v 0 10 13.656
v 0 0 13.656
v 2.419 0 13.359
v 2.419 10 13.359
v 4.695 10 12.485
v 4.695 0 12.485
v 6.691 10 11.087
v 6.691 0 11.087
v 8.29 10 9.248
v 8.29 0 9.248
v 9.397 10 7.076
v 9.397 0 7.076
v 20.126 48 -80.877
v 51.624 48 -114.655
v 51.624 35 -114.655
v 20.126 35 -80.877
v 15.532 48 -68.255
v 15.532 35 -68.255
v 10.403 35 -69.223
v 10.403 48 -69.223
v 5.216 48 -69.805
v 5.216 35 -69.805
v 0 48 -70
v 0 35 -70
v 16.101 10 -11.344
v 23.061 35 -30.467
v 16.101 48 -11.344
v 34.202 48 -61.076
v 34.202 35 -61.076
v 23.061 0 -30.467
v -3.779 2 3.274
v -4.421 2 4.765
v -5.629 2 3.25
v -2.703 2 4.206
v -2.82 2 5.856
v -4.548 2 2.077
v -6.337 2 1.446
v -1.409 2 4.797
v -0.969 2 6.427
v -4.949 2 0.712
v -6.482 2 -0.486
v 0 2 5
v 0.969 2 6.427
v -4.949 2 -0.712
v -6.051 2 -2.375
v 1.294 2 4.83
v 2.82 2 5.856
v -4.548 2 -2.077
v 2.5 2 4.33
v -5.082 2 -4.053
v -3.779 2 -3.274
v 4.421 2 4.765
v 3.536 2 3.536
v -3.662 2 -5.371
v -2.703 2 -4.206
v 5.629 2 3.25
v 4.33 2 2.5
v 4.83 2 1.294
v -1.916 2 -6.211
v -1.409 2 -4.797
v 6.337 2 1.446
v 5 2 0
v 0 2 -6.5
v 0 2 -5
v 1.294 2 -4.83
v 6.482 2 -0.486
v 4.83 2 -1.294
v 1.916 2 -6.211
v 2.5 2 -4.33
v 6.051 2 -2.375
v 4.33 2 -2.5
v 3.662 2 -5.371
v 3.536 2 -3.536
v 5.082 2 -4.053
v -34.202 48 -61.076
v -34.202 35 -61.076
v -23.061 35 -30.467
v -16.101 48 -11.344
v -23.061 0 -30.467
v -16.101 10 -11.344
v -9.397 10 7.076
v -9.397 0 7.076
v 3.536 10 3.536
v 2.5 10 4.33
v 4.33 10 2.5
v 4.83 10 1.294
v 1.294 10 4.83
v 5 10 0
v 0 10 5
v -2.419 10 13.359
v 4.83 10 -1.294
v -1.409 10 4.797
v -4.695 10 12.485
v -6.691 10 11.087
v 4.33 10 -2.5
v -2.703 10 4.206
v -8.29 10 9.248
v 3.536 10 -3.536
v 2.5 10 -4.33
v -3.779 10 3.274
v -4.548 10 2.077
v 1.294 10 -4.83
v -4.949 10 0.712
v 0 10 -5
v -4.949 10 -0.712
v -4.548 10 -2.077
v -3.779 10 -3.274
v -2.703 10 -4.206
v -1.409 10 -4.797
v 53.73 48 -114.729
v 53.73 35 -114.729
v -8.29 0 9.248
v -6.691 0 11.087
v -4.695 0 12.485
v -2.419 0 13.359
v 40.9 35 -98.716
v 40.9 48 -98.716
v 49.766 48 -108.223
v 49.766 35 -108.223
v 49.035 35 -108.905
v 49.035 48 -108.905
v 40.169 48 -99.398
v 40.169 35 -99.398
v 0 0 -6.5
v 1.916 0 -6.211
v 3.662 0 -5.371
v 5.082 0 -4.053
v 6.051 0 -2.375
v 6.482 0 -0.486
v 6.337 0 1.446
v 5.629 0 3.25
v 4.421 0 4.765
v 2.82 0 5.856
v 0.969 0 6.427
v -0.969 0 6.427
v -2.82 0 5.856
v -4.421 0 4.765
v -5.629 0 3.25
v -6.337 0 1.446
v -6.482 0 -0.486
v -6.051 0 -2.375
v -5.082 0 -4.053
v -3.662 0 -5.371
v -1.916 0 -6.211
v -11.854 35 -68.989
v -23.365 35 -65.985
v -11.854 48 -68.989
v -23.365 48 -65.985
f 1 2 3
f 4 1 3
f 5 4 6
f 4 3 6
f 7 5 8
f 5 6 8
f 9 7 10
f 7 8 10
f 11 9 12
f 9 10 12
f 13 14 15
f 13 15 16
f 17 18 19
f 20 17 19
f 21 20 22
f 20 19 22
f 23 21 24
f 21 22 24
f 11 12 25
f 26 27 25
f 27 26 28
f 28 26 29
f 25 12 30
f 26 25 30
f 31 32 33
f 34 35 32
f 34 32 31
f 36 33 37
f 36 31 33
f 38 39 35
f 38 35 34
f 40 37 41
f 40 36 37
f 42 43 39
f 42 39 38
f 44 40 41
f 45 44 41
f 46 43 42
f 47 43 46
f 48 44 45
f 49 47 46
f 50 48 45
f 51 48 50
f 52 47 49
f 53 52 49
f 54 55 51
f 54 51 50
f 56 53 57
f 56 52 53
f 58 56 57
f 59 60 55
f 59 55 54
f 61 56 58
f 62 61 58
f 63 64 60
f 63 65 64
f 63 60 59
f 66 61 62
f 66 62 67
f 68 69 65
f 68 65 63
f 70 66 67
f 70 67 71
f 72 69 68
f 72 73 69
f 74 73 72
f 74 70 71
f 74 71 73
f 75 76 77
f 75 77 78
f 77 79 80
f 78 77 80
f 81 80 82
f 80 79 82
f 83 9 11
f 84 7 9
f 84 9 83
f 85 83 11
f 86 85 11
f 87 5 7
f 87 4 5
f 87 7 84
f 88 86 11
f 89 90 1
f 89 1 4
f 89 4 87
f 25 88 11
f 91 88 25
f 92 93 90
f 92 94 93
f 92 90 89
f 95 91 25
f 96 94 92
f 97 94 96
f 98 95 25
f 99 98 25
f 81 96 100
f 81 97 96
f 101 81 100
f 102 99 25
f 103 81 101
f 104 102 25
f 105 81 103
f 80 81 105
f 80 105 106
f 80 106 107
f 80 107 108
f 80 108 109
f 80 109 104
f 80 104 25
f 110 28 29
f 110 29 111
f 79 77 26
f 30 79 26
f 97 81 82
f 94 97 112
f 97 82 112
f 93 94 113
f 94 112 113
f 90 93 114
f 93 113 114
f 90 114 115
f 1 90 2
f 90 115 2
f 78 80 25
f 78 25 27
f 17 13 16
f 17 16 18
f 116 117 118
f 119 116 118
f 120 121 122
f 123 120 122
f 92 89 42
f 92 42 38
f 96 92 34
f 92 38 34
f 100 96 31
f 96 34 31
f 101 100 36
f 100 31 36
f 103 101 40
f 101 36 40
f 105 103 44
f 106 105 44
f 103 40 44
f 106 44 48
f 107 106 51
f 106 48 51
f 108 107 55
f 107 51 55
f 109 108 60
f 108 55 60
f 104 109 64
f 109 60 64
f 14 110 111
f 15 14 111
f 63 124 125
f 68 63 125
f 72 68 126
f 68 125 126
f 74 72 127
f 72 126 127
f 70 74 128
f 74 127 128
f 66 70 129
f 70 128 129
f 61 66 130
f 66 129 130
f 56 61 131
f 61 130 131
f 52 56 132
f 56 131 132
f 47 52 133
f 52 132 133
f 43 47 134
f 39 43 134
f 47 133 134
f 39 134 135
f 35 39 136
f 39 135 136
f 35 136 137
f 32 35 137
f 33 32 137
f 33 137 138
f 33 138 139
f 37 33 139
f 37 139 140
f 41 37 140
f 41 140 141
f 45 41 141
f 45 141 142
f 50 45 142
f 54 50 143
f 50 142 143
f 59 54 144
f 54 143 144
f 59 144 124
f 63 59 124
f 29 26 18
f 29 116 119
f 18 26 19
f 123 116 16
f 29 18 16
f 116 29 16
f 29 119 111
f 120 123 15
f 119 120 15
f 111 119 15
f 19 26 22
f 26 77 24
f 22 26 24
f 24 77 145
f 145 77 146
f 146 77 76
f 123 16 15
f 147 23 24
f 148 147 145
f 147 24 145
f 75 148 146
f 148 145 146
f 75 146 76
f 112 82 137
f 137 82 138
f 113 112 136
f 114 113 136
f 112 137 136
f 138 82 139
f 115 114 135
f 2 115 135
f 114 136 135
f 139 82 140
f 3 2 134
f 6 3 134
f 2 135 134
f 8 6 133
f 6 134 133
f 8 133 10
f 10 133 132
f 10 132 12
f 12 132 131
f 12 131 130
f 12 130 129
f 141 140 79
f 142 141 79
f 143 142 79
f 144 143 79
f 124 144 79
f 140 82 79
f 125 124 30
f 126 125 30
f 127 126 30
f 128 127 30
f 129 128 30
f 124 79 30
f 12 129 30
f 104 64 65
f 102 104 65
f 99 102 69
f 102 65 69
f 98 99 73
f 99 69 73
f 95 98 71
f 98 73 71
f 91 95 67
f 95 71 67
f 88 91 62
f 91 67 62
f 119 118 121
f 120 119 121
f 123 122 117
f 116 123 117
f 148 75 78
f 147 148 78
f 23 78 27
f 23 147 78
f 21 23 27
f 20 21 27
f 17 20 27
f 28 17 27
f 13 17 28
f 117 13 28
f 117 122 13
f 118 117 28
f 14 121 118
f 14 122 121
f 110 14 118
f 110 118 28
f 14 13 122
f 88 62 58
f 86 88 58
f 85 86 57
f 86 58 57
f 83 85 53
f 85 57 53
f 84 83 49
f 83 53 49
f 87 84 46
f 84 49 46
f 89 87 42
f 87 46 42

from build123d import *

# Parameters (mm, degrees)
EXTRUDE_1_DEPTH            = 48
CUT_EXTRUDE_2_REACH        = 96.508
CUT_EXTRUDE_2_START_RADIUS = 70
CUT_EXTRUDE_2_END_RADIUS   = 70
SKETCH_3_W                 = 58.404028666
SKETCH_3_H                 = 6
EXTRUDE_2_DEPTH            = 13
CUT_EXTRUDE_3_DEPTH        = 140.034418617
CUT_EXTRUDE_3_DEPTH_BACK   = 140.034418617
SKETCH_4_W                 = 25
SKETCH_4_H                 = 38
SKETCH_4_W_2               = 40
SKETCH_4_H_2               = 25
CHAMFER_1_SIZE             = 5
CHAMFER_1_SIZE2            = 3.813196151
SKETCH_6_R                 = 6.5
CUT_EXTRUDE_4_DEPTH        = 2
SKETCH_7_R                 = 1.5
CUT_EXTRUDE_5_DEPTH        = 60
SKETCH_8_W                 = 9
SKETCH_8_H                 = 9
CUT_EXTRUDE_6_DEPTH        = 11
CUT_EXTRUDE_8_REACH        = 137.533
SKETCH_10_R                = 1
CUT_EXTRUDE_9_REACH        = 105.034
CUT_EXTRUDE_9_END_RADIUS   = 70
SKETCH_11_R                = 0.75
SKETCH_12_W                = 20
SKETCH_12_H                = 3
CUT_EXTRUDE_10_DEPTH       = 11
SKETCH_13_W                = 3.868283576
SKETCH_13_H                = 1.5
CUT_EXTRUDE_11_DEPTH       = 4
CUT_EXTRUDE_12_REACH       = 137.476
SKETCH_15_W                = 94.926723873
SKETCH_15_H                = 55.523178114
CUT_EXTRUDE_13_DEPTH       = 10


with BuildPart() as part:
    # 草图1 → 凸台-拉伸1 (new body)
    with BuildSketch(Plane(origin=(0, 0, 0), x_dir=(1, 0, 0), z_dir=(0, 1, 0))):
        with BuildLine():
            ThreePointArc((-9.396926208, -7.075874358), (-5.735764364, -11.847193368), (0, -13.655672925))
            Line((0, -13.655672925), (0, -5))
            ThreePointArc((0, -5), (-5, 0), (0, 5))
            Line((0, 5), (0, 70))
            ThreePointArc((0, 70), (-17.673593853, 67.732149533), (-34.202014333, 61.075545152))
            Line((-34.202014333, 61.075545152), (-9.396926208, -7.075874358))
        make_face()
        with BuildLine():
            Line((0, -5), (0, -13.655672925))
            ThreePointArc((0, -13.655672925), (5.735764364, -11.847193368), (9.396926208, -7.075874358))
            Line((9.396926208, -7.075874358), (34.202014333, 61.075545152))
            ThreePointArc((34.202014333, 61.075545152), (17.673593853, 67.732149533), (0, 70))
            Line((0, 70), (0, 5))
            ThreePointArc((0, 5), (3.535533906, 3.535533906), (5, 0))
            ThreePointArc((5, 0), (3.535533906, -3.535533906), (0, -5))
        make_face()
    extrude(amount=EXTRUDE_1_DEPTH)

    # 切除-拉伸2: from a cylinder face, 96.508 long prism both ways, kept between that surface and its translate by the depth
    cut_extrude_2_start = Plane(origin=(0, 5, 0), z_dir=(0, -1, 0)) * Cylinder(CUT_EXTRUDE_2_START_RADIUS, 334.016, mode=Mode.PRIVATE)
    cut_extrude_2_end = Plane(origin=(0, 5, 3), z_dir=(0, -1, 0)) * Cylinder(CUT_EXTRUDE_2_END_RADIUS, 334.016, mode=Mode.PRIVATE)
    # 草图3 → 切除-拉伸2 (cut, from a surface)
    with BuildSketch(Plane.XY, mode=Mode.PRIVATE) as cut_extrude_2_sk1:
        with Locations((3, 5)):
            Rectangle(SKETCH_3_W, SKETCH_3_H)
    cut_extrude_2_tool1 = extrude(cut_extrude_2_sk1.sketch, amount=CUT_EXTRUDE_2_REACH, both=True, mode=Mode.PRIVATE)
    add(((cut_extrude_2_tool1 & cut_extrude_2_start) - cut_extrude_2_end).solids().sort_by_distance((3, 5, -62.032204))[0], mode=Mode.SUBTRACT)

    # 草图2 → 凸台-拉伸2 (add)
    with BuildSketch(Plane(origin=(0, 48, 0), x_dir=(1, 0, 0), z_dir=(0, 1, 0))):
        Polygon((24.252642572, 33.739870901), (55.034455471, 118.312206771), (20.125623779, 80.877067961), (5.458790156, 40.580273767), align=None)
    extrude(amount=-EXTRUDE_2_DEPTH)

    # 草图4 → 切除-拉伸3 (cut, two sides: drawn at the far end of the back side and taken through both)
    with BuildSketch(Plane(origin=(0, 0, 0), x_dir=(0, 0, -1), z_dir=(1, 0, 0)).offset(-CUT_EXTRUDE_3_DEPTH_BACK)):
        with Locations((-1.155672925, 29)):
            Rectangle(SKETCH_4_W, SKETCH_4_H)
        with Locations((50.466884927, 22.5)):
            Rectangle(SKETCH_4_W_2, SKETCH_4_H_2)
    extrude(amount=CUT_EXTRUDE_3_DEPTH + CUT_EXTRUDE_3_DEPTH_BACK, mode=Mode.SUBTRACT)

    # 倒角1
    chamfer_1_edges = [part.edges().sort_by_distance(p)[0] for p in [
        (55.034455471, 41.5, -118.312206771),
    ]]
    chamfer_1_side = [part.faces().sort_by_distance(p)[0] for p in [
        (37.580039625, 41.5, -99.594637366),
    ]]
    chamfer(chamfer_1_edges, length=CHAMFER_1_SIZE, length2=CHAMFER_1_SIZE2, reference=chamfer_1_side[0])

    # 草图6 → 切除-拉伸4 (cut)
    with BuildSketch(Plane.XZ):
        with Locations(Location((0, 0, 0), (0, 0, 270))):
            Circle(SKETCH_6_R)
    extrude(amount=-CUT_EXTRUDE_4_DEPTH, mode=Mode.SUBTRACT)

    # 草图7 → 切除-拉伸5 (cut)
    with BuildSketch(Plane.XY):
        with Locations((-30.202014333, 5)):
            Circle(SKETCH_7_R)
    extrude(amount=-CUT_EXTRUDE_5_DEPTH, mode=Mode.SUBTRACT)

    # 草图8 → 切除-拉伸6 (cut)
    with BuildSketch(Plane(origin=(0, 10, 0), x_dir=(1, 0, 0), z_dir=(0, 1, 0))):
        with Locations((-30.258231885, 50.240091929)):
            Rectangle(SKETCH_8_W, SKETCH_8_H)
    extrude(amount=-CUT_EXTRUDE_6_DEPTH, mode=Mode.SUBTRACT)

    # 切除-拉伸8: up to this plane
    cut_extrude_8_end = Plane(origin=(32.202014333, 48, -62.153280468), z_dir=(-1, 0, 0))
    # 草图10 → 切除-拉伸8 (cut, up to the surface)
    with BuildSketch(Plane(origin=(10.571836839, 0, 3.847833931), x_dir=(0.34202014332566283, 0, -0.9396926207859106), z_dir=(0.9396926207859106, 0, 0.34202014332566283)), mode=Mode.PRIVATE) as cut_extrude_8_sk1:
        with Locations((67.590016934, 5)):
            Circle(SKETCH_10_R)
    cut_extrude_8_tool1 = split(extrude(cut_extrude_8_sk1.sketch, amount=-CUT_EXTRUDE_8_REACH, mode=Mode.PRIVATE), bisect_by=cut_extrude_8_end, keep=Keep.BOTH, mode=Mode.PRIVATE)
    add(cut_extrude_8_tool1.solids().sort_by_distance((33.688984, 5, -59.666006))[0], mode=Mode.SUBTRACT)

    # 切除-拉伸9: up to this cylinder (the profile starts inside it)
    cut_extrude_9_end = Plane(origin=(0, 5, 0), z_dir=(0, -1, 0)) * Cylinder(CUT_EXTRUDE_9_END_RADIUS, 351.068, mode=Mode.PRIVATE)
    # 草图11 → 切除-拉伸9 (cut, up to the surface)
    with BuildSketch(Plane.XY.offset(-60), mode=Mode.PRIVATE) as cut_extrude_9_sk1:
        with Locations((-30.202014333, 5)):
            Circle(SKETCH_11_R)
    cut_extrude_9_tool1 = extrude(cut_extrude_9_sk1.sketch, amount=-CUT_EXTRUDE_9_REACH, mode=Mode.PRIVATE) & cut_extrude_9_end
    add(cut_extrude_9_tool1.solids().sort_by_distance((-30.202014, 5, -60))[0], mode=Mode.SUBTRACT)

    # 草图12 → 切除-拉伸10 (cut)
    with BuildSketch(Plane(origin=(0, 10, 0), x_dir=(1, 0, 0), z_dir=(0, 1, 0))):
        with Locations((8.346963974, 51.411545488)):
            Rectangle(SKETCH_12_W, SKETCH_12_H)
    extrude(amount=-CUT_EXTRUDE_10_DEPTH, mode=Mode.SUBTRACT)

    # 草图13 → 切除-拉伸11 (cut)
    with BuildSketch(Plane(origin=(0, 10, 0), x_dir=(1, 0, 0), z_dir=(0, 1, 0))):
        with Locations((29.542762739, 51.411545488)):
            Rectangle(SKETCH_13_W, SKETCH_13_H)
    extrude(amount=-CUT_EXTRUDE_11_DEPTH, mode=Mode.SUBTRACT)

    # 草图14 → 切除-拉伸12 (cut, up to next)
    with BuildSketch(Plane(origin=(0, 48, 0), x_dir=(1, 0, 0), z_dir=(0, 1, 0)), mode=Mode.PRIVATE) as cut_extrude_12_sk1:
        Polygon((49.766128767, 108.223290792), (49.034775066, 108.905289152), (40.168796385, 99.397691031), (40.900150086, 98.715692671), align=None)
    cut_extrude_12_tool1 = extrude(cut_extrude_12_sk1.sketch, amount=-CUT_EXTRUDE_12_REACH, mode=Mode.PRIVATE) & part.part
    add(cut_extrude_12_tool1.solids().sort_by_distance((44.967463, 48, -103.810491))[0], mode=Mode.SUBTRACT)

    # 草图15 → 切除-拉伸13 (cut)
    with BuildSketch(Plane(origin=(0, 10, 0), x_dir=(1, 0, 0), z_dir=(0, 1, 0))):
        with Locations((-0.892742436, 58.228473984)):
            Rectangle(SKETCH_15_W, SKETCH_15_H)
    extrude(amount=-CUT_EXTRUDE_13_DEPTH, mode=Mode.SUBTRACT)


solid = part.part
